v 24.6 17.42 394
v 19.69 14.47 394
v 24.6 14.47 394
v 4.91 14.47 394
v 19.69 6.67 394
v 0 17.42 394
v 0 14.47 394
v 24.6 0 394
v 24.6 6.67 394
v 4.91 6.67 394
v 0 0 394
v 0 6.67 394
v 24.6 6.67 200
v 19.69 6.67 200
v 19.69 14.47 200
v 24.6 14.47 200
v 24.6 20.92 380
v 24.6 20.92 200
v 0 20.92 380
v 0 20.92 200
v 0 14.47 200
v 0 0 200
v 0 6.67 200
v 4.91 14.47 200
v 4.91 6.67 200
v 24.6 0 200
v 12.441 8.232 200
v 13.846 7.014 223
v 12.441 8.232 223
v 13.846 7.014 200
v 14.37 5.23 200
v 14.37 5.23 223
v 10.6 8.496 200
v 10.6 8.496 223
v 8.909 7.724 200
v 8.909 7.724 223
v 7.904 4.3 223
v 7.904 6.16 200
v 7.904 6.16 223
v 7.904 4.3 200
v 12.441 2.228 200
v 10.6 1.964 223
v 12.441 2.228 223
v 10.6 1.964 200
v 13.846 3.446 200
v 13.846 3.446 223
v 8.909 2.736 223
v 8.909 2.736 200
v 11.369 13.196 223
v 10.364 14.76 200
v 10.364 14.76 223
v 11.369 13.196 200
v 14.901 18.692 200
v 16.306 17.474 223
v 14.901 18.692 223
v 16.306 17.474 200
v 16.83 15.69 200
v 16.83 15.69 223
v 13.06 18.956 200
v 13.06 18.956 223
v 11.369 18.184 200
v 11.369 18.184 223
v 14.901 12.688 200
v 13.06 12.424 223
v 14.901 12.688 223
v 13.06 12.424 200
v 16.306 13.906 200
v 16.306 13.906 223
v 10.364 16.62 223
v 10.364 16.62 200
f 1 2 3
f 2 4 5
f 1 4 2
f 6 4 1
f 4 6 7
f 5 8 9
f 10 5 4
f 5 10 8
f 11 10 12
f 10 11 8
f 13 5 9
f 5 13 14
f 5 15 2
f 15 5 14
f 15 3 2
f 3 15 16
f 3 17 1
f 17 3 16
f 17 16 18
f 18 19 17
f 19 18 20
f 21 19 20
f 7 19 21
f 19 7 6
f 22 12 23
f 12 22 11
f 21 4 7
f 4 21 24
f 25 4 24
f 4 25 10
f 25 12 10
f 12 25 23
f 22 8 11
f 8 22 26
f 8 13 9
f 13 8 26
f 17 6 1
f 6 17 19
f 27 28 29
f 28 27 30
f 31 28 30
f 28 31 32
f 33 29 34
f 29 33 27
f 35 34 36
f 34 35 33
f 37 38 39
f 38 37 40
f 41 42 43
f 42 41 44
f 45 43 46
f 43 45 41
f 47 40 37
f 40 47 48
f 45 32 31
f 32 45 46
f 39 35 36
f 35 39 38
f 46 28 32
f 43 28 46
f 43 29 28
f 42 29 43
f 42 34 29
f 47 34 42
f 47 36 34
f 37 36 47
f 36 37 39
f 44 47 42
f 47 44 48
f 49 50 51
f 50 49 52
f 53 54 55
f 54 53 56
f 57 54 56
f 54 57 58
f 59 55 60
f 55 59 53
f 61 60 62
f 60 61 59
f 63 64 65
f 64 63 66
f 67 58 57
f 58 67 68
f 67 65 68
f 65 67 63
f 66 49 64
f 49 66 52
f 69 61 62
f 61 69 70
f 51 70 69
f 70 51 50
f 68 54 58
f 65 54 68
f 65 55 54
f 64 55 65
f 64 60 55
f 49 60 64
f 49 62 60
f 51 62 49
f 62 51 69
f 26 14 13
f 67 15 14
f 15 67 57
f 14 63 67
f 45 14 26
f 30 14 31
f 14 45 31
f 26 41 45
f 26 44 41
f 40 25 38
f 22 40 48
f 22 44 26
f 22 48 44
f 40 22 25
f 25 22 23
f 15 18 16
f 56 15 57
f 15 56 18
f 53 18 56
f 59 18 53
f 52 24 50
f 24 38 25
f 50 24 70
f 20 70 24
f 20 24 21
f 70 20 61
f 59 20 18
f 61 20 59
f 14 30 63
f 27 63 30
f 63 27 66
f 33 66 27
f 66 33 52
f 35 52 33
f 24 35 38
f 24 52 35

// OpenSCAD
LOWER_NOTCH_HEIGHT = 6.67;
MIDDLE_NOTCH_HEIGHT = 7.8;
UPPER_NOTCH_HEIGHT = 6.45;

NOTCH_WIDTH = 4.91;

RAIL_HEIGHT = LOWER_NOTCH_HEIGHT + MIDDLE_NOTCH_HEIGHT + UPPER_NOTCH_HEIGHT;

RAIL_WIDTH = 24.6;

RAIL_LENGTH = 394; // trimmed 2mm for round using ikea metal pegs

FRONT_LEN = 200;

module cross_section() {
    polygon([
            [0, 0],
            [0, LOWER_NOTCH_HEIGHT],
            [NOTCH_WIDTH, LOWER_NOTCH_HEIGHT],
            [NOTCH_WIDTH, LOWER_NOTCH_HEIGHT + MIDDLE_NOTCH_HEIGHT],
            [0, LOWER_NOTCH_HEIGHT + MIDDLE_NOTCH_HEIGHT],
            [0, RAIL_HEIGHT],
            [RAIL_WIDTH, RAIL_HEIGHT],
            [RAIL_WIDTH, LOWER_NOTCH_HEIGHT + MIDDLE_NOTCH_HEIGHT],
            [RAIL_WIDTH - NOTCH_WIDTH, LOWER_NOTCH_HEIGHT + MIDDLE_NOTCH_HEIGHT],
            [RAIL_WIDTH - NOTCH_WIDTH, LOWER_NOTCH_HEIGHT],
            [RAIL_WIDTH, LOWER_NOTCH_HEIGHT],
            [RAIL_WIDTH, 0],
    ]);
}

//module back_cross_section() {
//    polygon([
//        [NOTCH_WIDTH, 8.15],
//        [NOTCH_WIDTH, 8.15 + 9.8],
//        [RAIL_WIDTH - NOTCH_WIDTH, 8.15 + 9.8],
//        [RAIL_WIDTH - NOTCH_WIDTH, 8.15],
//    ]);
//}

module front_cross_section() {
        polygon([
            [NOTCH_WIDTH, LOWER_NOTCH_HEIGHT],
            [NOTCH_WIDTH, LOWER_NOTCH_HEIGHT + MIDDLE_NOTCH_HEIGHT],
            [0, LOWER_NOTCH_HEIGHT + MIDDLE_NOTCH_HEIGHT],
            [0, RAIL_HEIGHT-3.3],
            [RAIL_WIDTH, RAIL_HEIGHT-3.3],
            [RAIL_WIDTH, LOWER_NOTCH_HEIGHT + MIDDLE_NOTCH_HEIGHT],
            [RAIL_WIDTH - NOTCH_WIDTH, LOWER_NOTCH_HEIGHT + MIDDLE_NOTCH_HEIGHT],
            [RAIL_WIDTH - NOTCH_WIDTH, LOWER_NOTCH_HEIGHT],
    ]);
}


module full_rail() {
    difference() {
        linear_extrude(height=RAIL_LENGTH) {cross_section();};
        color("green") translate([0, RAIL_HEIGHT, 380]) rotate([atan(3.5/14), 0, 0]) cube([RAIL_WIDTH, 10, 30]);
    }
    
    difference() {
        translate([0, 0, -18.76]) linear_extrude(height=18.76) {front_cross_section();};
        color("blue") translate([14, 0, -9.25]) rotate([90, 0, 0]) cylinder(h=50, r=2.5, center=true);
        color("red") translate([-3, 0, -30]) rotate([0, atan(-5/18.76), 0]) cube([10, 20, 30]);
        color("green") translate([RAIL_WIDTH -9, 0, -28]) rotate([0, atan(6/18.76), 0]) cube([10, 20, 30]);
    }
}


//module male_peg() {
//    z_depth = 19;
//    translate([RAIL_WIDTH / 2, RAIL_HEIGHT / 2, FRONT_LEN - z_depth/2]) cube([RAIL_WIDTH - NOTCH_WIDTH*2 - 5 - .2, RAIL_HEIGHT-12 -.2, z_depth], center=true);
//}
//
//module female_hole() {
//    z_depth = 20;
//    translate([RAIL_WIDTH / 2, RAIL_HEIGHT / 2, FRONT_LEN - z_depth/2]) cube([RAIL_WIDTH - NOTCH_WIDTH*2 - 5, RAIL_HEIGHT-12, z_depth], center=true);
//}

module metal_peg_holes() {
    z_depth = 46;
    peg_radius = 3.3;
    translate([RAIL_WIDTH * .45, RAIL_HEIGHT / 4, FRONT_LEN]) cylinder(h = z_depth, r=peg_radius, center=true);
    translate([RAIL_WIDTH * .55, 3* RAIL_HEIGHT / 4, FRONT_LEN]) cylinder(h = z_depth, r=peg_radius, center=true);

}


module back_rail() {
    difference() {
        full_rail();
        translate([0, 0, -40]) color("purple") cube([50, 50, FRONT_LEN + 40]);
        metal_peg_holes();
    }
//    male_peg();

}

module front_rail() {
    difference() {
        full_rail();
        translate([0, 0, FRONT_LEN]) color("purple") cube([50, 50, 300]);
        metal_peg_holes();
//        female_hole();

    }

}

//full_rail();
back_rail();
//front_rail();

//color("green") metal_peg_holes();

//difference() {
//  color("pink") female_hole();
//  color("blue") male_peg();
//}
